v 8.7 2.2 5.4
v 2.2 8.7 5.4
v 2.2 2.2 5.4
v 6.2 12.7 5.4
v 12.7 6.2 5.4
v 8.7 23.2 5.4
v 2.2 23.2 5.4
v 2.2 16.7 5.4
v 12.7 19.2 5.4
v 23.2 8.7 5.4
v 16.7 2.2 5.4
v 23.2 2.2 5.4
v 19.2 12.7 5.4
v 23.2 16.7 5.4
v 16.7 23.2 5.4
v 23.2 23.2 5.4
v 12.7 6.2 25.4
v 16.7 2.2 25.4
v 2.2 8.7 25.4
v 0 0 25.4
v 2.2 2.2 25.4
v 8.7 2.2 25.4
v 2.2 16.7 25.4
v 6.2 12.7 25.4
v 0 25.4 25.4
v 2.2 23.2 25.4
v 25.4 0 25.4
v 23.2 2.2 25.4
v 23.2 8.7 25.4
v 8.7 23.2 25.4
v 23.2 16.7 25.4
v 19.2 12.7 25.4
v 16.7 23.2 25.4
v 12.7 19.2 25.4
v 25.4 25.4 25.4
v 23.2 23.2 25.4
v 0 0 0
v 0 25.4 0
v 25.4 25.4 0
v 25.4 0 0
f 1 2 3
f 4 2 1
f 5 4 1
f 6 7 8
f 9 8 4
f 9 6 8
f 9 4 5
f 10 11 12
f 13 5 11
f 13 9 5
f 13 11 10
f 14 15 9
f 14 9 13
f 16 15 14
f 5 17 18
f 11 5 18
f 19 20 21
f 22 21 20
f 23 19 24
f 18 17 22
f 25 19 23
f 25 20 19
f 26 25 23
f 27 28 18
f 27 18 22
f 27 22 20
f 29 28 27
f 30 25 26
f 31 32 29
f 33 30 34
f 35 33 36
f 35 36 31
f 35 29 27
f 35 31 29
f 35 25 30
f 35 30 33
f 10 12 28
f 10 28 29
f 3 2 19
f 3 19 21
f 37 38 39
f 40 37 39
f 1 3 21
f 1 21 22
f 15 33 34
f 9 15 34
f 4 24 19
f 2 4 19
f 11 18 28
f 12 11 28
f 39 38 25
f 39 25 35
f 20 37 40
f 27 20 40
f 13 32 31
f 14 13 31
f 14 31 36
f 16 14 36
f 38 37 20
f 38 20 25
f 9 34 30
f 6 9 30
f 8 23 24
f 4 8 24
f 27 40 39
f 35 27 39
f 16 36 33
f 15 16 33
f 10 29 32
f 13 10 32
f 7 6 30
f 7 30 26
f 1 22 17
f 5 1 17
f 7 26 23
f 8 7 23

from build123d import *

# Parameters (mm, degrees)
F0_W     = 25.4
F0_H     = 25.4
F1_DEPTH = 25.4
F3_DEPTH = 20


with BuildPart() as f1:
    # F0 (on Top) → F1 (new body)
    with BuildSketch(Plane.XY):
        with Locations((12.7, 12.7)):
            Rectangle(F0_W, F0_H)
    extrude(amount=F1_DEPTH)

    # F2 (on face) → F3 (cut)
    with BuildSketch(Plane.XY.offset(25.4)):
        Polygon((19.2, 12.7), (12.7, 12.7), (12.7, 6.2), (16.7, 2.2), (23.2, 2.2), (23.2, 8.7), align=None)
        Polygon((12.7, 19.2), (12.7, 12.7), (19.2, 12.7), (23.2, 16.7), (23.2, 23.2), (16.7, 23.2), align=None)
        Polygon((12.7, 12.7), (6.2, 12.7), (2.2, 8.7), (2.2, 2.2), (8.7, 2.2), (12.7, 6.2), align=None)
        Polygon((2.2, 16.7), (6.2, 12.7), (12.7, 12.7), (12.7, 19.2), (8.7, 23.2), (2.2, 23.2), align=None)
    extrude(amount=-F3_DEPTH, mode=Mode.SUBTRACT)


solid = f1.part
